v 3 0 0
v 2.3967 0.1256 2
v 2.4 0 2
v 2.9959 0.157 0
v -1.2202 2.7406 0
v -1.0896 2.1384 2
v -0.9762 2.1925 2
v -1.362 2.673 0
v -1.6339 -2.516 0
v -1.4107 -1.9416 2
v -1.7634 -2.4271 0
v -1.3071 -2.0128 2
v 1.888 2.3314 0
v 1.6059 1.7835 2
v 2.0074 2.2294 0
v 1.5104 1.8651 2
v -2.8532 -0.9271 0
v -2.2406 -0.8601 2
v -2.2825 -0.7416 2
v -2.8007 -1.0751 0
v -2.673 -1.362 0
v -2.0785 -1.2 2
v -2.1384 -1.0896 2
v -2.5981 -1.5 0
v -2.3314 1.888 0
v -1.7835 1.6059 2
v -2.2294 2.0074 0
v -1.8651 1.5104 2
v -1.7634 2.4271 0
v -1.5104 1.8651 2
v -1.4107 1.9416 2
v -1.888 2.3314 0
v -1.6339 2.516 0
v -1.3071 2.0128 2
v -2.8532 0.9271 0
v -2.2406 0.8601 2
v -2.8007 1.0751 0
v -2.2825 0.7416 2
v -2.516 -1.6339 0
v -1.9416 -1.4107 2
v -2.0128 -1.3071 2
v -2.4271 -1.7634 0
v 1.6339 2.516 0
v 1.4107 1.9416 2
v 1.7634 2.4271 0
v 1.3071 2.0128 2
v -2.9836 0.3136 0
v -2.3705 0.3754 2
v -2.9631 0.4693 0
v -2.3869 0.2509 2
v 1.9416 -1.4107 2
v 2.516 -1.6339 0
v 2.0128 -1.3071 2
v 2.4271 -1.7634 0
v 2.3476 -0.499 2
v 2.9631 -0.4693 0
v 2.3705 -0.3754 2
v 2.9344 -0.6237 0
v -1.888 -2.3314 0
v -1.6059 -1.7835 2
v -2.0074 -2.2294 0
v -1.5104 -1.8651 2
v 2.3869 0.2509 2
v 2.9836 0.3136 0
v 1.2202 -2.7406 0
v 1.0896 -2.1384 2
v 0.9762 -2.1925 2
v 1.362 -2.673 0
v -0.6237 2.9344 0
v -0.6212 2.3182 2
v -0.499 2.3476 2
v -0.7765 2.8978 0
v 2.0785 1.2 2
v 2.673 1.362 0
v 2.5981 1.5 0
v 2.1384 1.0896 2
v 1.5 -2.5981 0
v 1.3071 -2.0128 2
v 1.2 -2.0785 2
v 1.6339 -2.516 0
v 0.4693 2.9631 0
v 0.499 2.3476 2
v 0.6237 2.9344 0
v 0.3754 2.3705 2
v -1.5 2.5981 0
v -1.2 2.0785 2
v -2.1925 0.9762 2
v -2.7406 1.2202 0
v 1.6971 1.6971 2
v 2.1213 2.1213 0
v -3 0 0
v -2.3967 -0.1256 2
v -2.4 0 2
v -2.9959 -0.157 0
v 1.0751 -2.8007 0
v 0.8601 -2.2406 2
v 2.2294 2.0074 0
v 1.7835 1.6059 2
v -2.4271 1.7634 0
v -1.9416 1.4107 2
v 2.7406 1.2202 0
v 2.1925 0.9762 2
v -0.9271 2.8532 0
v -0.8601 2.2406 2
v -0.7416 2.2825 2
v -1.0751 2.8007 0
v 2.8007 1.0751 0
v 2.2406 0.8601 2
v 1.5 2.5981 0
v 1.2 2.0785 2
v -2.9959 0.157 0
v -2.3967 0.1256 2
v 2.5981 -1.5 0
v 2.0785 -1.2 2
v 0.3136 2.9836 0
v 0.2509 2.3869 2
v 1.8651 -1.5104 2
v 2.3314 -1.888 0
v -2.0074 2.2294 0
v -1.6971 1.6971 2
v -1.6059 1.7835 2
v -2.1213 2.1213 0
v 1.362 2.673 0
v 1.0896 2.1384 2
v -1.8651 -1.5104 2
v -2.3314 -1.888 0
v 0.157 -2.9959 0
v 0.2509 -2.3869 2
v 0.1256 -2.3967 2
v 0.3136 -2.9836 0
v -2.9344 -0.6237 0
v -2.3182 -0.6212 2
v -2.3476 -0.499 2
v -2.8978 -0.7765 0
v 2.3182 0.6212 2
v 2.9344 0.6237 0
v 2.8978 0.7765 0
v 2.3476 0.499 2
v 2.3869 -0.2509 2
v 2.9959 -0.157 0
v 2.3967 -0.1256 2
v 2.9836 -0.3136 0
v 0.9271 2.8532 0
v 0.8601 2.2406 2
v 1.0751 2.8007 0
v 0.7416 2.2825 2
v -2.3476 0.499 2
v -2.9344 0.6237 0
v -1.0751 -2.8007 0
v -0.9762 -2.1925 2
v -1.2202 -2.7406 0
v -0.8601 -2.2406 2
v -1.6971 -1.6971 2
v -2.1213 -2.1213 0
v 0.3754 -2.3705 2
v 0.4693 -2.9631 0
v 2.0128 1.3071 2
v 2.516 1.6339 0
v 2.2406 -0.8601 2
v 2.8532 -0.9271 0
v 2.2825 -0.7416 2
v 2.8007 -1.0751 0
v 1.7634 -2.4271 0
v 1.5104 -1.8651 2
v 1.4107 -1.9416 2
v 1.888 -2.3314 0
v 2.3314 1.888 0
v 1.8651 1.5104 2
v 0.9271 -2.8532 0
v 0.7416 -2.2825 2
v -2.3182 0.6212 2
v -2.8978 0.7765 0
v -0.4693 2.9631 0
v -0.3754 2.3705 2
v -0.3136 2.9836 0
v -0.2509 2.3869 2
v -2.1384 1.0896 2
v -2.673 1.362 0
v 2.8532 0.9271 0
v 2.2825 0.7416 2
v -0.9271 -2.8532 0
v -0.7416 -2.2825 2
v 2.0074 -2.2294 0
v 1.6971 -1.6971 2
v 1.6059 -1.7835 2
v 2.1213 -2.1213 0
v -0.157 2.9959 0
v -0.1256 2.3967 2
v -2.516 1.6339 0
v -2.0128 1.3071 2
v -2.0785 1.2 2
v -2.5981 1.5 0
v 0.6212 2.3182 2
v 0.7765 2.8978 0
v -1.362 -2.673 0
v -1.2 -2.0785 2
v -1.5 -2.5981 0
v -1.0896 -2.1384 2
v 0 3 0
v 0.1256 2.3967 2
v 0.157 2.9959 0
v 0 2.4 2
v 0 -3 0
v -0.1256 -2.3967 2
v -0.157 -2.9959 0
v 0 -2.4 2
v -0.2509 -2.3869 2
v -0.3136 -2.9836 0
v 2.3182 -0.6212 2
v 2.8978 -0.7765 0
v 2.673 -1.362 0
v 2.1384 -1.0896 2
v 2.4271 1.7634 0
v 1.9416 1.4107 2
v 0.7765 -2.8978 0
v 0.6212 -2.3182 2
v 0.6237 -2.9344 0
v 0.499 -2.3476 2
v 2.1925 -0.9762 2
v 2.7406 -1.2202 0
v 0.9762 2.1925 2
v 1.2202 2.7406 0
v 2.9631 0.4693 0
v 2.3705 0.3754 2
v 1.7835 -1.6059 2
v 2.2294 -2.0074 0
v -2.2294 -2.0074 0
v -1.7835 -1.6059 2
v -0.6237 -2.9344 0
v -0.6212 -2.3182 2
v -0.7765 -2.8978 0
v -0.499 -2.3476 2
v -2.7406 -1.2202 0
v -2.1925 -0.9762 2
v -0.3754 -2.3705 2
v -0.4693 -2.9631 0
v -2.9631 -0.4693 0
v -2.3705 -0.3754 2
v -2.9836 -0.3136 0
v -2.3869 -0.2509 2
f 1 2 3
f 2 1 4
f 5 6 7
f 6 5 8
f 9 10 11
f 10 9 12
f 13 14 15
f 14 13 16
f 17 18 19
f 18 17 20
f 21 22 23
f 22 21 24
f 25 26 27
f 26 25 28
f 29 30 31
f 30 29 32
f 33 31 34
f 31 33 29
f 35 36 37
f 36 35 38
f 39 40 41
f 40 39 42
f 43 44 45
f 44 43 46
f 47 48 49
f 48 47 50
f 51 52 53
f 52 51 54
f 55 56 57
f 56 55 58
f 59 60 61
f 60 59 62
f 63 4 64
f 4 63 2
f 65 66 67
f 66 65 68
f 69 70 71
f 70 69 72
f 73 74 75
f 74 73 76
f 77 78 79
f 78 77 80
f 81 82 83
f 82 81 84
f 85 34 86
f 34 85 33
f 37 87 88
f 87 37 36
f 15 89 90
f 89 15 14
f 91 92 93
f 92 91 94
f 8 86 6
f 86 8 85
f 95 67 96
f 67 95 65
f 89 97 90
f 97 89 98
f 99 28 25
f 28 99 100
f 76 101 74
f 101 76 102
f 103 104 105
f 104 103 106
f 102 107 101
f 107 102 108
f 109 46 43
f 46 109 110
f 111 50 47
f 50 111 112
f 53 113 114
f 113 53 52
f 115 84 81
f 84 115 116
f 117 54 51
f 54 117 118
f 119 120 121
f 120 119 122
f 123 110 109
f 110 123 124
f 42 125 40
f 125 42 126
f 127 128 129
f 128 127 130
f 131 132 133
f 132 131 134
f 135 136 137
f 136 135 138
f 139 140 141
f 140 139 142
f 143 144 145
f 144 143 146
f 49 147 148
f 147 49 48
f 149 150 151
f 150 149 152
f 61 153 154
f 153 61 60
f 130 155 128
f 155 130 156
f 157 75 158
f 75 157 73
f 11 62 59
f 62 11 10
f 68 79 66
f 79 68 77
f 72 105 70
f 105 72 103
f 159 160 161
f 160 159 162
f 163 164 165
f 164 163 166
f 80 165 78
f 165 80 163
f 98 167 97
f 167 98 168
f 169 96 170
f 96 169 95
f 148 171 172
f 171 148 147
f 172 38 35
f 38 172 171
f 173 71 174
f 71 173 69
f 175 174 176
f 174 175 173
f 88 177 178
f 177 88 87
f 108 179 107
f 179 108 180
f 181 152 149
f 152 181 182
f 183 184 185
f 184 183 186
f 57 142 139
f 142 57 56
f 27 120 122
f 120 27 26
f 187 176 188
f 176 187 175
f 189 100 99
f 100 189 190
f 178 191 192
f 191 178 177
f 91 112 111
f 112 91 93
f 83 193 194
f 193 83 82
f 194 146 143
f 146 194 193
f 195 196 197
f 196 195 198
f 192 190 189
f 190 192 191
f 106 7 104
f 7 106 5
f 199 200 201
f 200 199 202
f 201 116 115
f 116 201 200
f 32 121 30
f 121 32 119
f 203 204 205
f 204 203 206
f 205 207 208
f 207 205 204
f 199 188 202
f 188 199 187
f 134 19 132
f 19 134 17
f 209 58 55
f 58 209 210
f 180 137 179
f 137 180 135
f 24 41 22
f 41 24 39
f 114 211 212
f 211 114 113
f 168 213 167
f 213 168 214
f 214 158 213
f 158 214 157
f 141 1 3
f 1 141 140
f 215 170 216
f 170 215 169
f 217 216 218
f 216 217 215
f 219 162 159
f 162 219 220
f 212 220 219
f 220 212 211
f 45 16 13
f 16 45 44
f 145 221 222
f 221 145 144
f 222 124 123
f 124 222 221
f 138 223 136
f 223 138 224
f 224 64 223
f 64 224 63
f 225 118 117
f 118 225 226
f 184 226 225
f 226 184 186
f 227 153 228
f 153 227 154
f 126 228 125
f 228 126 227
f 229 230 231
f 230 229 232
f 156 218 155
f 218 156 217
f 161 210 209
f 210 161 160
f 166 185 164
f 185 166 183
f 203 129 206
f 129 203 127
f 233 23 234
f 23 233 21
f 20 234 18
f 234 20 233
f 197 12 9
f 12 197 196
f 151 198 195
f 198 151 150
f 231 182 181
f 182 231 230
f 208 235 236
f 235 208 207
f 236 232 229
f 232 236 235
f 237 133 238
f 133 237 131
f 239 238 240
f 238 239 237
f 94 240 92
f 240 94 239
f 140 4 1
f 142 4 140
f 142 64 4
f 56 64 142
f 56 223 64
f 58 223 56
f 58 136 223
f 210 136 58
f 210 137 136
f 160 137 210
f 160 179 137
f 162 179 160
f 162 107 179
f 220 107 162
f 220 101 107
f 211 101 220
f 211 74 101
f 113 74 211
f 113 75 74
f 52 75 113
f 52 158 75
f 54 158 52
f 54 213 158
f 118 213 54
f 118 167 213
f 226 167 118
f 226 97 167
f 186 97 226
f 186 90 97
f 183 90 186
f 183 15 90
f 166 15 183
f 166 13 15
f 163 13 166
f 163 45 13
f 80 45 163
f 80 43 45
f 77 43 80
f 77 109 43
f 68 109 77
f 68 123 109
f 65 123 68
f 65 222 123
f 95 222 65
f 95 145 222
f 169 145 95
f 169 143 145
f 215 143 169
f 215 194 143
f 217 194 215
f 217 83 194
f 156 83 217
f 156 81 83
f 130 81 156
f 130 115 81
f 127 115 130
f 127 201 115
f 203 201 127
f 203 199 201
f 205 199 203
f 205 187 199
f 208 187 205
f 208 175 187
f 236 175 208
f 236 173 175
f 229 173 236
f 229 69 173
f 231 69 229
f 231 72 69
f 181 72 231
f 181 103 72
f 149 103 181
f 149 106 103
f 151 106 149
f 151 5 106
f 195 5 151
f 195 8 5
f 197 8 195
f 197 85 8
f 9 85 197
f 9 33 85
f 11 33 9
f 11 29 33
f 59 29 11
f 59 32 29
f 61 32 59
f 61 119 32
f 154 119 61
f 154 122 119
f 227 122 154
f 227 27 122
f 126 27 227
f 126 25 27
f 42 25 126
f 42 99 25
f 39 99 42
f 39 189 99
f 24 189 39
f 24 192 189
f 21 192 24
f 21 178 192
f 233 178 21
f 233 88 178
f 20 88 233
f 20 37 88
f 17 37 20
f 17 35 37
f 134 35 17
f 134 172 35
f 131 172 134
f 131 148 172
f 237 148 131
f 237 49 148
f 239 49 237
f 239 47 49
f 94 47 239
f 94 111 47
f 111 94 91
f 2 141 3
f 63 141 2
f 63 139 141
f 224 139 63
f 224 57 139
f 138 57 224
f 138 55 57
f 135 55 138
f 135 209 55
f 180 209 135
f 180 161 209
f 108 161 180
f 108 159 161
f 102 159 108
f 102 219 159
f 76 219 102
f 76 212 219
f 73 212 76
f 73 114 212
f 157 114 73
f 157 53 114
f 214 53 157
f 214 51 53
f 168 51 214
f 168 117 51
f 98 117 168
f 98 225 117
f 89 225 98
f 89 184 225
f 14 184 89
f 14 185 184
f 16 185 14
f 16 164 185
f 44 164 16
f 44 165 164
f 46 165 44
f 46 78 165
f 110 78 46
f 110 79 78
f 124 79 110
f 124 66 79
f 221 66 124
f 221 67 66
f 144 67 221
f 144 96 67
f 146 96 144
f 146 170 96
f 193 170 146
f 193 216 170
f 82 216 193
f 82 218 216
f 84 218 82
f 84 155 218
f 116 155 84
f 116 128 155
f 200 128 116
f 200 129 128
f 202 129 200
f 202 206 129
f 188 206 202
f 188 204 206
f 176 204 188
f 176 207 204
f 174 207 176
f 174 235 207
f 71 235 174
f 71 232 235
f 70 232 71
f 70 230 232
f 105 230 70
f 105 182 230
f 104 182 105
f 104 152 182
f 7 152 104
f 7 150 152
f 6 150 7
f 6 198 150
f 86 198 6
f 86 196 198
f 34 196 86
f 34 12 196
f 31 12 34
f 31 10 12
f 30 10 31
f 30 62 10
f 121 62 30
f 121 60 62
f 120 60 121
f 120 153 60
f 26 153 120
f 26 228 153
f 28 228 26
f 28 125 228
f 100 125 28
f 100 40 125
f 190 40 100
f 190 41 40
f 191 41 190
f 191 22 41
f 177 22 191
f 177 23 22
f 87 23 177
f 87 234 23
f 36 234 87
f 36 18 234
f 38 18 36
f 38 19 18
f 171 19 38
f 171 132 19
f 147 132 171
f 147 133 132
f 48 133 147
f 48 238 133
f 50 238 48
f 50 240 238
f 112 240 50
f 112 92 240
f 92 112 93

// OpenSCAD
// =====================================
// Multi-family Parametric Tip Generator
// =====================================
// Use CLI like:
// openscad -o out.stl -D shape_id=1 -D tip_length=12 -D tip_radius=3 -D wall_thickness=0.5 -D inner_depth=8 tip.scad
//
// shape_id:
// 0 = solid_cone
// 1 = hollow_cone
// 2 = rod (cylinder)
// 3 = hemisphere_cap (dome)
// 4 = half_ellipsoid (cap)
// 5 = pill (capsule)

// Defaults only if not provided via -D
shape_id       = is_undef(shape_id)       ? 1    : shape_id;
tip_length     = is_undef(tip_length)     ? 10   : tip_length;      // mm
tip_radius     = is_undef(tip_radius)     ? 3    : tip_radius;      // mm
wall_thickness = is_undef(wall_thickness) ? 0.5  : wall_thickness;  // mm
inner_depth    = is_undef(inner_depth)    ? 8    : inner_depth;     // mm
fn_smooth      = is_undef(fn_smooth)      ? 120  : fn_smooth;

$fn = fn_smooth;

// Guardrails
L = max(tip_length, 0.01);
R = max(tip_radius, 0.01);
t = min(max(wall_thickness, 0.0), 0.95*R);
d = min(max(inner_depth, 0.0), L);

// --- shape modules ---
module solid_cone() {
    cylinder(h=L, r1=R, r2=0);
}

module hollow_cone() {
    difference() {
        cylinder(h=L, r1=R, r2=0);
        translate([0,0, L-d])
            cylinder(h=d, r1=max(R-t, 0.0), r2=0);
    }
}

module rod() {
    cylinder(h=L, r=R);
}

module hemisphere_cap() {
    // Dome sitting on z=0 plane, height ~ R
    intersection() {
        sphere(r=R);
        translate([-2*R,-2*R,0]) cube([4*R,4*R,2*R], center=false);
    }
}

module half_ellipsoid() {
    // Ellipsoid cap: radii (R,R,alpha*R). Use alpha= L/R but limit it.
    alpha = min(max(L/R, 0.2), 4.0);
    intersection() {
        scale([1,1,alpha]) sphere(r=R);
        translate([-2*R,-2*R,0]) cube([4*R,4*R,4*R], center=false);
    }
}

module pill() {
    // Capsule of length L (end-to-end). Cylinder length is max(L-2R, 0).
    cylL = max(L - 2*R, 0);
    union() {
        translate([0,0,R]) cylinder(h=cylL, r=R);
        sphere(r=R);
        translate([0,0,R+cylL]) sphere(r=R);
    }
}

// --- select ---
if (shape_id == 0) solid_cone();
else if (shape_id == 1) hollow_cone();
else if (shape_id == 2) rod();
else if (shape_id == 3) hemisphere_cap();
else if (shape_id == 4) half_ellipsoid();
else if (shape_id == 5) pill();
else hollow_cone();
